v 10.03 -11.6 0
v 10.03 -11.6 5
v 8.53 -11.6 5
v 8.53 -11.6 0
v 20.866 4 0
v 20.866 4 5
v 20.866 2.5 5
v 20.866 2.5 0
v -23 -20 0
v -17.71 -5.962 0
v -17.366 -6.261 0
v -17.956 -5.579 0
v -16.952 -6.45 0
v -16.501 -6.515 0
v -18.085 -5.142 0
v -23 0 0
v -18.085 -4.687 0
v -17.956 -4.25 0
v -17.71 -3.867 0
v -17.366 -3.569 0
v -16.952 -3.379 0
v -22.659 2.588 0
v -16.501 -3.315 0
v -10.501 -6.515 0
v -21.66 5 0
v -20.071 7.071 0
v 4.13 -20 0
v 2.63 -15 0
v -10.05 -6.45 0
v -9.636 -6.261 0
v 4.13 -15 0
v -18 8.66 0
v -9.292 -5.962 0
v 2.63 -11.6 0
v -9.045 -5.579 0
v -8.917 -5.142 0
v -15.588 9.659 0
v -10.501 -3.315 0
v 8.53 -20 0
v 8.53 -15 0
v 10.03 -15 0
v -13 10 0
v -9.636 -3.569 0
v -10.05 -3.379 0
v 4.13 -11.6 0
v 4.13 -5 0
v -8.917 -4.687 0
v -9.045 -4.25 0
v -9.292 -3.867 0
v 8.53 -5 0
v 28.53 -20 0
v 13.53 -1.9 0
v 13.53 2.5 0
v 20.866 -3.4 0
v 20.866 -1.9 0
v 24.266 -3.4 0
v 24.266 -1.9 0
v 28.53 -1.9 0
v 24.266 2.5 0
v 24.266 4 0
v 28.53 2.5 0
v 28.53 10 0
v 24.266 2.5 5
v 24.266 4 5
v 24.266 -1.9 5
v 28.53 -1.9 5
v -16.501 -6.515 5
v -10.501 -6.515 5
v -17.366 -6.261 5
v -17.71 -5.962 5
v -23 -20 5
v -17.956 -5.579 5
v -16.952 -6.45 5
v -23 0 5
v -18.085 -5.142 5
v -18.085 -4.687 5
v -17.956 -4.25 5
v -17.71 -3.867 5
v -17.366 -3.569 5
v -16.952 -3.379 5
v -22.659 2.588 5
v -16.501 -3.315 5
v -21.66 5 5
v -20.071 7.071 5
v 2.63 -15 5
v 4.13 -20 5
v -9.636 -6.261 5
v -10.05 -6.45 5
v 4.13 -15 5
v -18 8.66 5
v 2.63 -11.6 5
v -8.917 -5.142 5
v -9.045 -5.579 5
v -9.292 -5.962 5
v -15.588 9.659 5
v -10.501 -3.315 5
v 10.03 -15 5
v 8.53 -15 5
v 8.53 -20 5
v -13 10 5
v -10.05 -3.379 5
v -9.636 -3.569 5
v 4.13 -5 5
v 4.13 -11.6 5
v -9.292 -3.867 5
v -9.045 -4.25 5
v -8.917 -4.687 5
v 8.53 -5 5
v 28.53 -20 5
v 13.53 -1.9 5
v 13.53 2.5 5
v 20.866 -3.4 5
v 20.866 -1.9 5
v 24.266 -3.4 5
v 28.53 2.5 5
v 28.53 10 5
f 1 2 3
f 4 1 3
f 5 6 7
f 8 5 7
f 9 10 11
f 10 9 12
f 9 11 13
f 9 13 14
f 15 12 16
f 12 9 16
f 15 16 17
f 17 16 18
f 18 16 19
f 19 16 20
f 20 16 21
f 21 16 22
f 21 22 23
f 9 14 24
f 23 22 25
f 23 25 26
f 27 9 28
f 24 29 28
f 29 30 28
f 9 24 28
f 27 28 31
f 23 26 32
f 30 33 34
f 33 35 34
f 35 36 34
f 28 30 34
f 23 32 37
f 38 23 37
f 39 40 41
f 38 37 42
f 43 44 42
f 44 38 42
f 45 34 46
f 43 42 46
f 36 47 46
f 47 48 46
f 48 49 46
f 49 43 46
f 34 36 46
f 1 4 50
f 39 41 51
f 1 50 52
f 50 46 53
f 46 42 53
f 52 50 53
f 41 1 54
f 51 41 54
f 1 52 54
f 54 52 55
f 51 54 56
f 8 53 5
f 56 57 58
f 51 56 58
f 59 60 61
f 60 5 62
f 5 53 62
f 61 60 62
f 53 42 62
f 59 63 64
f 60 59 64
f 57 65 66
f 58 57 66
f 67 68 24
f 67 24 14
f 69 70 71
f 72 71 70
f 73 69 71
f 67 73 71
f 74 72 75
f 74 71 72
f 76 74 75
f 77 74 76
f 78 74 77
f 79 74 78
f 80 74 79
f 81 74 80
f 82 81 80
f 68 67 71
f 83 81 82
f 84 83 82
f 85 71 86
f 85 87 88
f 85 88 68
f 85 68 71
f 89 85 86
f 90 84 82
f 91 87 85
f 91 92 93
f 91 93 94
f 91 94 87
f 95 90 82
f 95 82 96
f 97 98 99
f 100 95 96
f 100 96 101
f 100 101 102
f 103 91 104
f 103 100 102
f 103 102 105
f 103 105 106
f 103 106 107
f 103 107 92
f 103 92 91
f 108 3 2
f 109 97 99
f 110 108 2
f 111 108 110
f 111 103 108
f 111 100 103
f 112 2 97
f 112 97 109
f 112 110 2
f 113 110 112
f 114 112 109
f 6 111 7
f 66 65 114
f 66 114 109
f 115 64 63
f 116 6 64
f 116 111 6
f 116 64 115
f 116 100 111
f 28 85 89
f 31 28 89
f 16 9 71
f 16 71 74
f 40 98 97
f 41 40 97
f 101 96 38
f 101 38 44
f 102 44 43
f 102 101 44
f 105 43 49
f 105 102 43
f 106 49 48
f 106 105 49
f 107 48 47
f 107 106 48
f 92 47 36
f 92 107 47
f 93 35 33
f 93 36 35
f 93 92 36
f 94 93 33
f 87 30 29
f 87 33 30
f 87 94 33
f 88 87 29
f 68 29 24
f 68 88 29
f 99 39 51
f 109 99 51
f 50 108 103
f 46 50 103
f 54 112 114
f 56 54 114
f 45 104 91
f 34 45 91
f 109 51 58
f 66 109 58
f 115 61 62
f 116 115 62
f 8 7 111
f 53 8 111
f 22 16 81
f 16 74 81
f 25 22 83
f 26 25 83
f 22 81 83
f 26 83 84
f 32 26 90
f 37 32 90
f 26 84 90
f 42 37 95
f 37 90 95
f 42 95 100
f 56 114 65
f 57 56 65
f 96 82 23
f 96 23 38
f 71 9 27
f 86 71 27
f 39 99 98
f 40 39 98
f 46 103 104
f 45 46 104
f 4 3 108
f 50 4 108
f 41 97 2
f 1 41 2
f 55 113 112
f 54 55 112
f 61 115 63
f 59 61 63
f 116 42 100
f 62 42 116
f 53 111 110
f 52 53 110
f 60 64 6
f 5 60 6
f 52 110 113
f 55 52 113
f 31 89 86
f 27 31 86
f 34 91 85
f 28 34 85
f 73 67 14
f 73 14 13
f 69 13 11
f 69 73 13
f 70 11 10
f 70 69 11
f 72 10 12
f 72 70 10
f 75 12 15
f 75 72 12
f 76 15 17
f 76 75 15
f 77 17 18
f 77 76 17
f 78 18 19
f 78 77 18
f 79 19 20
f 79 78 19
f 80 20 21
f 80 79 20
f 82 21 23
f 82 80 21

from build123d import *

# Parameters (mm, degrees)
SKETCH1_W           = 51.53
SKETCH1_H           = 30
BOSS_EXTRUDE1_DEPTH = 5
CUT_EXTRUDE1_DEPTH  = 5
FILLET1_R           = 10
CUT_EXTRUDE5_DEPTH  = 10


with BuildPart() as part:
    # Sketch1 → Boss-Extrude1 (new body)
    with BuildSketch(Plane.XY):
        with Locations((2.765, -5)):
            Rectangle(SKETCH1_W, SKETCH1_H)
    extrude(amount=BOSS_EXTRUDE1_DEPTH)

    # Sketch2 → Cut-Extrude1 (cut)
    with BuildSketch(Plane.XY.offset(5)):
        Polygon((13.53, -1.9), (20.865904873, -1.9), (20.865904873, -3.4), (24.265904873, -3.4), (24.265904873, -1.9), (28.53, -1.9), (28.53, 2.5), (24.265904873, 2.5), (24.265904873, 4), (20.865904873, 4), (20.865904873, 2.5), (13.53, 2.5), align=None)
        Polygon((4.13, -5), (4.13, -11.6), (2.63, -11.6), (2.63, -15), (4.13, -15), (4.13, -20), (8.53, -20), (8.53, -15), (10.03, -15), (10.03, -11.6), (8.53, -11.6), (8.53, -5), align=None)
    extrude(amount=-CUT_EXTRUDE1_DEPTH, mode=Mode.SUBTRACT)

    # Fillet1
    fillet1_edges = [part.edges().sort_by_distance(p)[0] for p in [
        (-23, 10, 2.5),
    ]]
    fillet(fillet1_edges, radius=FILLET1_R)

    # Sketch6 → Cut-Extrude5 (cut)
    with BuildSketch(Plane.XY.offset(5)):
        with BuildLine():
            Line((-16.500870191, -3.314520992), (-10.500870191, -3.314520992))
            ThreePointArc((-10.500870191, -3.314520992), (-8.900870191, -4.914520992), (-10.500870191, -6.514520992))
            Line((-10.500870191, -6.514520992), (-16.500870191, -6.514520992))
            ThreePointArc((-16.500870191, -6.514520992), (-18.100870191, -4.914520992), (-16.500870191, -3.314520992))
        make_face()
    extrude(amount=-CUT_EXTRUDE5_DEPTH, mode=Mode.SUBTRACT)


solid = part.part
